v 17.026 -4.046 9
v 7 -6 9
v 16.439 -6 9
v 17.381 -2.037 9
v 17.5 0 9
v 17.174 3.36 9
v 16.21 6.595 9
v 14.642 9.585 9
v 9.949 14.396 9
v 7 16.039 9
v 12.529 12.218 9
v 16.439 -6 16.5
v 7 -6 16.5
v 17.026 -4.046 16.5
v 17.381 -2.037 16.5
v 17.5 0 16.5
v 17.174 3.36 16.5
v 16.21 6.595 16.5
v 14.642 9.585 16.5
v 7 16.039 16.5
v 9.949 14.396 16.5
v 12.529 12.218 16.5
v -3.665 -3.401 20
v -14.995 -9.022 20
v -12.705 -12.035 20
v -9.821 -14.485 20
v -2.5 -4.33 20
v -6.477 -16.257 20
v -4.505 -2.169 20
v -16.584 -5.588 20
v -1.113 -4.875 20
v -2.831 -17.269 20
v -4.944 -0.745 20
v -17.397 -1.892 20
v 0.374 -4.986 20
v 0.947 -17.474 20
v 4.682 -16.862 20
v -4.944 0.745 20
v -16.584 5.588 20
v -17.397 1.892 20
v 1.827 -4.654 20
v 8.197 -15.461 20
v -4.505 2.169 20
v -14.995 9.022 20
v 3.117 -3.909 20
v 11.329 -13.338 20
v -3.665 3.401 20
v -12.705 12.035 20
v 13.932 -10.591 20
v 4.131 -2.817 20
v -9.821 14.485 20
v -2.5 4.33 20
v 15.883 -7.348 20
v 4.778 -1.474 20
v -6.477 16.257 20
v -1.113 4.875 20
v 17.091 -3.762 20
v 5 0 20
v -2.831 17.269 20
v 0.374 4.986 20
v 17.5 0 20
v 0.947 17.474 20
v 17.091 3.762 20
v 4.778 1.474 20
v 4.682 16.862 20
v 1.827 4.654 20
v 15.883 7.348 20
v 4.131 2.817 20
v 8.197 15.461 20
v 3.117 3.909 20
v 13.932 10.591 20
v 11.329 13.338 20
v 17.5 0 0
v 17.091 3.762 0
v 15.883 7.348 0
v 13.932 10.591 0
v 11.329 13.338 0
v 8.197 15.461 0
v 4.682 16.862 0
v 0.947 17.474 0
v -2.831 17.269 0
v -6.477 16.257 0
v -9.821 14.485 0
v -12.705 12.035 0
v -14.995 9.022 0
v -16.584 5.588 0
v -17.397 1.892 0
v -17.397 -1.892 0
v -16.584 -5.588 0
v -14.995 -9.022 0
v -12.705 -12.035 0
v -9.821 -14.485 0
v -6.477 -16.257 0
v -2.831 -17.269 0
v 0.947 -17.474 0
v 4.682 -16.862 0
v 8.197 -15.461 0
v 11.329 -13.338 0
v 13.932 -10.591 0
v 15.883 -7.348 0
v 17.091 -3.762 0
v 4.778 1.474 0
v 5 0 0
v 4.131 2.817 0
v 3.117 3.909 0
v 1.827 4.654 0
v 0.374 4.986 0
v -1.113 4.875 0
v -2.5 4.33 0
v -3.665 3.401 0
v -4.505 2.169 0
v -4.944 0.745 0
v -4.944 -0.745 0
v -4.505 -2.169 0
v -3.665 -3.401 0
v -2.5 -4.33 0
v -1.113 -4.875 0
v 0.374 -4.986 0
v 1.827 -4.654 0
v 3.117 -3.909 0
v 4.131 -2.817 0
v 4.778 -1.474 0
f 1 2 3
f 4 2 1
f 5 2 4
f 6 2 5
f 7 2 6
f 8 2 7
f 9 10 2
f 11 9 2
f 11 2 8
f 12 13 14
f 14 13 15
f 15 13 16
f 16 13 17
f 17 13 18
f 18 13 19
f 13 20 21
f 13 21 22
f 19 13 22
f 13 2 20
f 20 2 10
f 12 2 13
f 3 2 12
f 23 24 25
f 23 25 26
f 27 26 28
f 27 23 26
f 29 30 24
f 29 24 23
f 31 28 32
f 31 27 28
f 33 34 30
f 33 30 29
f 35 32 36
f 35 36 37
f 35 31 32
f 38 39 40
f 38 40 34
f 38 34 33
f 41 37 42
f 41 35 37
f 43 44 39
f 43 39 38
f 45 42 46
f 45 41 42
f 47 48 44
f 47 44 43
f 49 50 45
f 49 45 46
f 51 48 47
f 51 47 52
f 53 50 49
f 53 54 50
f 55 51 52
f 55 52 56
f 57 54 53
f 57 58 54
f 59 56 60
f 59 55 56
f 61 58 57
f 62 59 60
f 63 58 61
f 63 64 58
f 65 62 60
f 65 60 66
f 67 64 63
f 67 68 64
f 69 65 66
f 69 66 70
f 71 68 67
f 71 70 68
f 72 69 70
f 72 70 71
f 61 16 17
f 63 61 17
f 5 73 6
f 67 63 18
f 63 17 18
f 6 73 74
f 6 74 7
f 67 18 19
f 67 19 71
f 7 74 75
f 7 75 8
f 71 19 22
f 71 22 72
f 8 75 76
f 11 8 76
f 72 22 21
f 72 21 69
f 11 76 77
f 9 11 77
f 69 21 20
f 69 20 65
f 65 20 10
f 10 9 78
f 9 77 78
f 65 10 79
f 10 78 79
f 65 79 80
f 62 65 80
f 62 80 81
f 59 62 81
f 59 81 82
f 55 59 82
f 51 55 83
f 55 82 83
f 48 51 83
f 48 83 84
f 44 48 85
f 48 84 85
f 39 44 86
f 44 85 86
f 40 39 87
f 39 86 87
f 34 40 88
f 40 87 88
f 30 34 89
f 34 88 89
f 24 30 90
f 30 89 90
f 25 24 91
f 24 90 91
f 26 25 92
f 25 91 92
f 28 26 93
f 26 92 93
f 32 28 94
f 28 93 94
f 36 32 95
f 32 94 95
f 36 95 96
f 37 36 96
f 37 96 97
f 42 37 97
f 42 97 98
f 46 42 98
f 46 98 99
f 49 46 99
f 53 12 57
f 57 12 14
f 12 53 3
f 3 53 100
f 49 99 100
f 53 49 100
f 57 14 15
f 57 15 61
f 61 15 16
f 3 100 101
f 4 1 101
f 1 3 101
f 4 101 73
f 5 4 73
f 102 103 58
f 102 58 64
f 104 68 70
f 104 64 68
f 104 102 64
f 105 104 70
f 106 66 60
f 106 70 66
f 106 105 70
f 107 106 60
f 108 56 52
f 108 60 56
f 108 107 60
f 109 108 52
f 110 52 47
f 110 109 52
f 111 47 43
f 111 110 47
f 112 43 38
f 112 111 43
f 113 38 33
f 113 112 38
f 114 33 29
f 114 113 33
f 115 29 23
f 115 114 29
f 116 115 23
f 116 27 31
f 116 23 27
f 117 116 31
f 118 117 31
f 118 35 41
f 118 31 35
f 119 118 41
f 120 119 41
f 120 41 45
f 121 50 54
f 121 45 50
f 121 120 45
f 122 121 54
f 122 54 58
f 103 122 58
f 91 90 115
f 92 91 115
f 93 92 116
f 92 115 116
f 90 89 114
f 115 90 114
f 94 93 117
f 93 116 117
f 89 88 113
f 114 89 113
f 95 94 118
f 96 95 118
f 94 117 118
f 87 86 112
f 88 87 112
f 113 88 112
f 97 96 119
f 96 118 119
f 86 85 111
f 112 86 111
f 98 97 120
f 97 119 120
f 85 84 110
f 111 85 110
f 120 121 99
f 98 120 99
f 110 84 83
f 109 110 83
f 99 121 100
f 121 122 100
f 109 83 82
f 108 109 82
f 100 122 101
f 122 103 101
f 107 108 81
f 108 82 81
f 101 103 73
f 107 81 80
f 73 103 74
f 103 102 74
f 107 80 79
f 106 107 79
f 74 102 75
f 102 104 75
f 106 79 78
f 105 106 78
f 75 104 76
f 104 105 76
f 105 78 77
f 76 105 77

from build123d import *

# Parameters (mm, degrees)
BOX_W             = 30
BOX_H             = 30
BOX_DEPTH         = 7.5
CYLINDER001_R     = 5
CYLINDER001_DEPTH = 40
CYLINDER_R        = 17.5
CYLINDER_DEPTH    = 20


with BuildPart() as cube:
    # Box → Box (new body)
    with BuildSketch(Plane(origin=(7, -6, 9), x_dir=(1, 0, 0), z_dir=(0, 0, 1))):
        with Locations((15, 15)):
            Rectangle(BOX_W, BOX_H)
    extrude(amount=BOX_DEPTH)


with BuildPart() as cylinder001:
    # Cylinder001 → Cylinder001 (new body)
    with BuildSketch(Plane.XY.offset(-10)):
        Circle(CYLINDER001_R)
    extrude(amount=CYLINDER001_DEPTH)


with BuildPart() as mount_bottom:
    # Cylinder → Cylinder (new body)
    with BuildSketch(Plane.XY):
        Circle(CYLINDER_R)
    extrude(amount=CYLINDER_DEPTH)

    # Cut: cut Cylinder001
    add(cylinder001.part, mode=Mode.SUBTRACT)

    # Cut001: cut Cube
    add(cube.part, mode=Mode.SUBTRACT)


solid = mount_bottom.part
